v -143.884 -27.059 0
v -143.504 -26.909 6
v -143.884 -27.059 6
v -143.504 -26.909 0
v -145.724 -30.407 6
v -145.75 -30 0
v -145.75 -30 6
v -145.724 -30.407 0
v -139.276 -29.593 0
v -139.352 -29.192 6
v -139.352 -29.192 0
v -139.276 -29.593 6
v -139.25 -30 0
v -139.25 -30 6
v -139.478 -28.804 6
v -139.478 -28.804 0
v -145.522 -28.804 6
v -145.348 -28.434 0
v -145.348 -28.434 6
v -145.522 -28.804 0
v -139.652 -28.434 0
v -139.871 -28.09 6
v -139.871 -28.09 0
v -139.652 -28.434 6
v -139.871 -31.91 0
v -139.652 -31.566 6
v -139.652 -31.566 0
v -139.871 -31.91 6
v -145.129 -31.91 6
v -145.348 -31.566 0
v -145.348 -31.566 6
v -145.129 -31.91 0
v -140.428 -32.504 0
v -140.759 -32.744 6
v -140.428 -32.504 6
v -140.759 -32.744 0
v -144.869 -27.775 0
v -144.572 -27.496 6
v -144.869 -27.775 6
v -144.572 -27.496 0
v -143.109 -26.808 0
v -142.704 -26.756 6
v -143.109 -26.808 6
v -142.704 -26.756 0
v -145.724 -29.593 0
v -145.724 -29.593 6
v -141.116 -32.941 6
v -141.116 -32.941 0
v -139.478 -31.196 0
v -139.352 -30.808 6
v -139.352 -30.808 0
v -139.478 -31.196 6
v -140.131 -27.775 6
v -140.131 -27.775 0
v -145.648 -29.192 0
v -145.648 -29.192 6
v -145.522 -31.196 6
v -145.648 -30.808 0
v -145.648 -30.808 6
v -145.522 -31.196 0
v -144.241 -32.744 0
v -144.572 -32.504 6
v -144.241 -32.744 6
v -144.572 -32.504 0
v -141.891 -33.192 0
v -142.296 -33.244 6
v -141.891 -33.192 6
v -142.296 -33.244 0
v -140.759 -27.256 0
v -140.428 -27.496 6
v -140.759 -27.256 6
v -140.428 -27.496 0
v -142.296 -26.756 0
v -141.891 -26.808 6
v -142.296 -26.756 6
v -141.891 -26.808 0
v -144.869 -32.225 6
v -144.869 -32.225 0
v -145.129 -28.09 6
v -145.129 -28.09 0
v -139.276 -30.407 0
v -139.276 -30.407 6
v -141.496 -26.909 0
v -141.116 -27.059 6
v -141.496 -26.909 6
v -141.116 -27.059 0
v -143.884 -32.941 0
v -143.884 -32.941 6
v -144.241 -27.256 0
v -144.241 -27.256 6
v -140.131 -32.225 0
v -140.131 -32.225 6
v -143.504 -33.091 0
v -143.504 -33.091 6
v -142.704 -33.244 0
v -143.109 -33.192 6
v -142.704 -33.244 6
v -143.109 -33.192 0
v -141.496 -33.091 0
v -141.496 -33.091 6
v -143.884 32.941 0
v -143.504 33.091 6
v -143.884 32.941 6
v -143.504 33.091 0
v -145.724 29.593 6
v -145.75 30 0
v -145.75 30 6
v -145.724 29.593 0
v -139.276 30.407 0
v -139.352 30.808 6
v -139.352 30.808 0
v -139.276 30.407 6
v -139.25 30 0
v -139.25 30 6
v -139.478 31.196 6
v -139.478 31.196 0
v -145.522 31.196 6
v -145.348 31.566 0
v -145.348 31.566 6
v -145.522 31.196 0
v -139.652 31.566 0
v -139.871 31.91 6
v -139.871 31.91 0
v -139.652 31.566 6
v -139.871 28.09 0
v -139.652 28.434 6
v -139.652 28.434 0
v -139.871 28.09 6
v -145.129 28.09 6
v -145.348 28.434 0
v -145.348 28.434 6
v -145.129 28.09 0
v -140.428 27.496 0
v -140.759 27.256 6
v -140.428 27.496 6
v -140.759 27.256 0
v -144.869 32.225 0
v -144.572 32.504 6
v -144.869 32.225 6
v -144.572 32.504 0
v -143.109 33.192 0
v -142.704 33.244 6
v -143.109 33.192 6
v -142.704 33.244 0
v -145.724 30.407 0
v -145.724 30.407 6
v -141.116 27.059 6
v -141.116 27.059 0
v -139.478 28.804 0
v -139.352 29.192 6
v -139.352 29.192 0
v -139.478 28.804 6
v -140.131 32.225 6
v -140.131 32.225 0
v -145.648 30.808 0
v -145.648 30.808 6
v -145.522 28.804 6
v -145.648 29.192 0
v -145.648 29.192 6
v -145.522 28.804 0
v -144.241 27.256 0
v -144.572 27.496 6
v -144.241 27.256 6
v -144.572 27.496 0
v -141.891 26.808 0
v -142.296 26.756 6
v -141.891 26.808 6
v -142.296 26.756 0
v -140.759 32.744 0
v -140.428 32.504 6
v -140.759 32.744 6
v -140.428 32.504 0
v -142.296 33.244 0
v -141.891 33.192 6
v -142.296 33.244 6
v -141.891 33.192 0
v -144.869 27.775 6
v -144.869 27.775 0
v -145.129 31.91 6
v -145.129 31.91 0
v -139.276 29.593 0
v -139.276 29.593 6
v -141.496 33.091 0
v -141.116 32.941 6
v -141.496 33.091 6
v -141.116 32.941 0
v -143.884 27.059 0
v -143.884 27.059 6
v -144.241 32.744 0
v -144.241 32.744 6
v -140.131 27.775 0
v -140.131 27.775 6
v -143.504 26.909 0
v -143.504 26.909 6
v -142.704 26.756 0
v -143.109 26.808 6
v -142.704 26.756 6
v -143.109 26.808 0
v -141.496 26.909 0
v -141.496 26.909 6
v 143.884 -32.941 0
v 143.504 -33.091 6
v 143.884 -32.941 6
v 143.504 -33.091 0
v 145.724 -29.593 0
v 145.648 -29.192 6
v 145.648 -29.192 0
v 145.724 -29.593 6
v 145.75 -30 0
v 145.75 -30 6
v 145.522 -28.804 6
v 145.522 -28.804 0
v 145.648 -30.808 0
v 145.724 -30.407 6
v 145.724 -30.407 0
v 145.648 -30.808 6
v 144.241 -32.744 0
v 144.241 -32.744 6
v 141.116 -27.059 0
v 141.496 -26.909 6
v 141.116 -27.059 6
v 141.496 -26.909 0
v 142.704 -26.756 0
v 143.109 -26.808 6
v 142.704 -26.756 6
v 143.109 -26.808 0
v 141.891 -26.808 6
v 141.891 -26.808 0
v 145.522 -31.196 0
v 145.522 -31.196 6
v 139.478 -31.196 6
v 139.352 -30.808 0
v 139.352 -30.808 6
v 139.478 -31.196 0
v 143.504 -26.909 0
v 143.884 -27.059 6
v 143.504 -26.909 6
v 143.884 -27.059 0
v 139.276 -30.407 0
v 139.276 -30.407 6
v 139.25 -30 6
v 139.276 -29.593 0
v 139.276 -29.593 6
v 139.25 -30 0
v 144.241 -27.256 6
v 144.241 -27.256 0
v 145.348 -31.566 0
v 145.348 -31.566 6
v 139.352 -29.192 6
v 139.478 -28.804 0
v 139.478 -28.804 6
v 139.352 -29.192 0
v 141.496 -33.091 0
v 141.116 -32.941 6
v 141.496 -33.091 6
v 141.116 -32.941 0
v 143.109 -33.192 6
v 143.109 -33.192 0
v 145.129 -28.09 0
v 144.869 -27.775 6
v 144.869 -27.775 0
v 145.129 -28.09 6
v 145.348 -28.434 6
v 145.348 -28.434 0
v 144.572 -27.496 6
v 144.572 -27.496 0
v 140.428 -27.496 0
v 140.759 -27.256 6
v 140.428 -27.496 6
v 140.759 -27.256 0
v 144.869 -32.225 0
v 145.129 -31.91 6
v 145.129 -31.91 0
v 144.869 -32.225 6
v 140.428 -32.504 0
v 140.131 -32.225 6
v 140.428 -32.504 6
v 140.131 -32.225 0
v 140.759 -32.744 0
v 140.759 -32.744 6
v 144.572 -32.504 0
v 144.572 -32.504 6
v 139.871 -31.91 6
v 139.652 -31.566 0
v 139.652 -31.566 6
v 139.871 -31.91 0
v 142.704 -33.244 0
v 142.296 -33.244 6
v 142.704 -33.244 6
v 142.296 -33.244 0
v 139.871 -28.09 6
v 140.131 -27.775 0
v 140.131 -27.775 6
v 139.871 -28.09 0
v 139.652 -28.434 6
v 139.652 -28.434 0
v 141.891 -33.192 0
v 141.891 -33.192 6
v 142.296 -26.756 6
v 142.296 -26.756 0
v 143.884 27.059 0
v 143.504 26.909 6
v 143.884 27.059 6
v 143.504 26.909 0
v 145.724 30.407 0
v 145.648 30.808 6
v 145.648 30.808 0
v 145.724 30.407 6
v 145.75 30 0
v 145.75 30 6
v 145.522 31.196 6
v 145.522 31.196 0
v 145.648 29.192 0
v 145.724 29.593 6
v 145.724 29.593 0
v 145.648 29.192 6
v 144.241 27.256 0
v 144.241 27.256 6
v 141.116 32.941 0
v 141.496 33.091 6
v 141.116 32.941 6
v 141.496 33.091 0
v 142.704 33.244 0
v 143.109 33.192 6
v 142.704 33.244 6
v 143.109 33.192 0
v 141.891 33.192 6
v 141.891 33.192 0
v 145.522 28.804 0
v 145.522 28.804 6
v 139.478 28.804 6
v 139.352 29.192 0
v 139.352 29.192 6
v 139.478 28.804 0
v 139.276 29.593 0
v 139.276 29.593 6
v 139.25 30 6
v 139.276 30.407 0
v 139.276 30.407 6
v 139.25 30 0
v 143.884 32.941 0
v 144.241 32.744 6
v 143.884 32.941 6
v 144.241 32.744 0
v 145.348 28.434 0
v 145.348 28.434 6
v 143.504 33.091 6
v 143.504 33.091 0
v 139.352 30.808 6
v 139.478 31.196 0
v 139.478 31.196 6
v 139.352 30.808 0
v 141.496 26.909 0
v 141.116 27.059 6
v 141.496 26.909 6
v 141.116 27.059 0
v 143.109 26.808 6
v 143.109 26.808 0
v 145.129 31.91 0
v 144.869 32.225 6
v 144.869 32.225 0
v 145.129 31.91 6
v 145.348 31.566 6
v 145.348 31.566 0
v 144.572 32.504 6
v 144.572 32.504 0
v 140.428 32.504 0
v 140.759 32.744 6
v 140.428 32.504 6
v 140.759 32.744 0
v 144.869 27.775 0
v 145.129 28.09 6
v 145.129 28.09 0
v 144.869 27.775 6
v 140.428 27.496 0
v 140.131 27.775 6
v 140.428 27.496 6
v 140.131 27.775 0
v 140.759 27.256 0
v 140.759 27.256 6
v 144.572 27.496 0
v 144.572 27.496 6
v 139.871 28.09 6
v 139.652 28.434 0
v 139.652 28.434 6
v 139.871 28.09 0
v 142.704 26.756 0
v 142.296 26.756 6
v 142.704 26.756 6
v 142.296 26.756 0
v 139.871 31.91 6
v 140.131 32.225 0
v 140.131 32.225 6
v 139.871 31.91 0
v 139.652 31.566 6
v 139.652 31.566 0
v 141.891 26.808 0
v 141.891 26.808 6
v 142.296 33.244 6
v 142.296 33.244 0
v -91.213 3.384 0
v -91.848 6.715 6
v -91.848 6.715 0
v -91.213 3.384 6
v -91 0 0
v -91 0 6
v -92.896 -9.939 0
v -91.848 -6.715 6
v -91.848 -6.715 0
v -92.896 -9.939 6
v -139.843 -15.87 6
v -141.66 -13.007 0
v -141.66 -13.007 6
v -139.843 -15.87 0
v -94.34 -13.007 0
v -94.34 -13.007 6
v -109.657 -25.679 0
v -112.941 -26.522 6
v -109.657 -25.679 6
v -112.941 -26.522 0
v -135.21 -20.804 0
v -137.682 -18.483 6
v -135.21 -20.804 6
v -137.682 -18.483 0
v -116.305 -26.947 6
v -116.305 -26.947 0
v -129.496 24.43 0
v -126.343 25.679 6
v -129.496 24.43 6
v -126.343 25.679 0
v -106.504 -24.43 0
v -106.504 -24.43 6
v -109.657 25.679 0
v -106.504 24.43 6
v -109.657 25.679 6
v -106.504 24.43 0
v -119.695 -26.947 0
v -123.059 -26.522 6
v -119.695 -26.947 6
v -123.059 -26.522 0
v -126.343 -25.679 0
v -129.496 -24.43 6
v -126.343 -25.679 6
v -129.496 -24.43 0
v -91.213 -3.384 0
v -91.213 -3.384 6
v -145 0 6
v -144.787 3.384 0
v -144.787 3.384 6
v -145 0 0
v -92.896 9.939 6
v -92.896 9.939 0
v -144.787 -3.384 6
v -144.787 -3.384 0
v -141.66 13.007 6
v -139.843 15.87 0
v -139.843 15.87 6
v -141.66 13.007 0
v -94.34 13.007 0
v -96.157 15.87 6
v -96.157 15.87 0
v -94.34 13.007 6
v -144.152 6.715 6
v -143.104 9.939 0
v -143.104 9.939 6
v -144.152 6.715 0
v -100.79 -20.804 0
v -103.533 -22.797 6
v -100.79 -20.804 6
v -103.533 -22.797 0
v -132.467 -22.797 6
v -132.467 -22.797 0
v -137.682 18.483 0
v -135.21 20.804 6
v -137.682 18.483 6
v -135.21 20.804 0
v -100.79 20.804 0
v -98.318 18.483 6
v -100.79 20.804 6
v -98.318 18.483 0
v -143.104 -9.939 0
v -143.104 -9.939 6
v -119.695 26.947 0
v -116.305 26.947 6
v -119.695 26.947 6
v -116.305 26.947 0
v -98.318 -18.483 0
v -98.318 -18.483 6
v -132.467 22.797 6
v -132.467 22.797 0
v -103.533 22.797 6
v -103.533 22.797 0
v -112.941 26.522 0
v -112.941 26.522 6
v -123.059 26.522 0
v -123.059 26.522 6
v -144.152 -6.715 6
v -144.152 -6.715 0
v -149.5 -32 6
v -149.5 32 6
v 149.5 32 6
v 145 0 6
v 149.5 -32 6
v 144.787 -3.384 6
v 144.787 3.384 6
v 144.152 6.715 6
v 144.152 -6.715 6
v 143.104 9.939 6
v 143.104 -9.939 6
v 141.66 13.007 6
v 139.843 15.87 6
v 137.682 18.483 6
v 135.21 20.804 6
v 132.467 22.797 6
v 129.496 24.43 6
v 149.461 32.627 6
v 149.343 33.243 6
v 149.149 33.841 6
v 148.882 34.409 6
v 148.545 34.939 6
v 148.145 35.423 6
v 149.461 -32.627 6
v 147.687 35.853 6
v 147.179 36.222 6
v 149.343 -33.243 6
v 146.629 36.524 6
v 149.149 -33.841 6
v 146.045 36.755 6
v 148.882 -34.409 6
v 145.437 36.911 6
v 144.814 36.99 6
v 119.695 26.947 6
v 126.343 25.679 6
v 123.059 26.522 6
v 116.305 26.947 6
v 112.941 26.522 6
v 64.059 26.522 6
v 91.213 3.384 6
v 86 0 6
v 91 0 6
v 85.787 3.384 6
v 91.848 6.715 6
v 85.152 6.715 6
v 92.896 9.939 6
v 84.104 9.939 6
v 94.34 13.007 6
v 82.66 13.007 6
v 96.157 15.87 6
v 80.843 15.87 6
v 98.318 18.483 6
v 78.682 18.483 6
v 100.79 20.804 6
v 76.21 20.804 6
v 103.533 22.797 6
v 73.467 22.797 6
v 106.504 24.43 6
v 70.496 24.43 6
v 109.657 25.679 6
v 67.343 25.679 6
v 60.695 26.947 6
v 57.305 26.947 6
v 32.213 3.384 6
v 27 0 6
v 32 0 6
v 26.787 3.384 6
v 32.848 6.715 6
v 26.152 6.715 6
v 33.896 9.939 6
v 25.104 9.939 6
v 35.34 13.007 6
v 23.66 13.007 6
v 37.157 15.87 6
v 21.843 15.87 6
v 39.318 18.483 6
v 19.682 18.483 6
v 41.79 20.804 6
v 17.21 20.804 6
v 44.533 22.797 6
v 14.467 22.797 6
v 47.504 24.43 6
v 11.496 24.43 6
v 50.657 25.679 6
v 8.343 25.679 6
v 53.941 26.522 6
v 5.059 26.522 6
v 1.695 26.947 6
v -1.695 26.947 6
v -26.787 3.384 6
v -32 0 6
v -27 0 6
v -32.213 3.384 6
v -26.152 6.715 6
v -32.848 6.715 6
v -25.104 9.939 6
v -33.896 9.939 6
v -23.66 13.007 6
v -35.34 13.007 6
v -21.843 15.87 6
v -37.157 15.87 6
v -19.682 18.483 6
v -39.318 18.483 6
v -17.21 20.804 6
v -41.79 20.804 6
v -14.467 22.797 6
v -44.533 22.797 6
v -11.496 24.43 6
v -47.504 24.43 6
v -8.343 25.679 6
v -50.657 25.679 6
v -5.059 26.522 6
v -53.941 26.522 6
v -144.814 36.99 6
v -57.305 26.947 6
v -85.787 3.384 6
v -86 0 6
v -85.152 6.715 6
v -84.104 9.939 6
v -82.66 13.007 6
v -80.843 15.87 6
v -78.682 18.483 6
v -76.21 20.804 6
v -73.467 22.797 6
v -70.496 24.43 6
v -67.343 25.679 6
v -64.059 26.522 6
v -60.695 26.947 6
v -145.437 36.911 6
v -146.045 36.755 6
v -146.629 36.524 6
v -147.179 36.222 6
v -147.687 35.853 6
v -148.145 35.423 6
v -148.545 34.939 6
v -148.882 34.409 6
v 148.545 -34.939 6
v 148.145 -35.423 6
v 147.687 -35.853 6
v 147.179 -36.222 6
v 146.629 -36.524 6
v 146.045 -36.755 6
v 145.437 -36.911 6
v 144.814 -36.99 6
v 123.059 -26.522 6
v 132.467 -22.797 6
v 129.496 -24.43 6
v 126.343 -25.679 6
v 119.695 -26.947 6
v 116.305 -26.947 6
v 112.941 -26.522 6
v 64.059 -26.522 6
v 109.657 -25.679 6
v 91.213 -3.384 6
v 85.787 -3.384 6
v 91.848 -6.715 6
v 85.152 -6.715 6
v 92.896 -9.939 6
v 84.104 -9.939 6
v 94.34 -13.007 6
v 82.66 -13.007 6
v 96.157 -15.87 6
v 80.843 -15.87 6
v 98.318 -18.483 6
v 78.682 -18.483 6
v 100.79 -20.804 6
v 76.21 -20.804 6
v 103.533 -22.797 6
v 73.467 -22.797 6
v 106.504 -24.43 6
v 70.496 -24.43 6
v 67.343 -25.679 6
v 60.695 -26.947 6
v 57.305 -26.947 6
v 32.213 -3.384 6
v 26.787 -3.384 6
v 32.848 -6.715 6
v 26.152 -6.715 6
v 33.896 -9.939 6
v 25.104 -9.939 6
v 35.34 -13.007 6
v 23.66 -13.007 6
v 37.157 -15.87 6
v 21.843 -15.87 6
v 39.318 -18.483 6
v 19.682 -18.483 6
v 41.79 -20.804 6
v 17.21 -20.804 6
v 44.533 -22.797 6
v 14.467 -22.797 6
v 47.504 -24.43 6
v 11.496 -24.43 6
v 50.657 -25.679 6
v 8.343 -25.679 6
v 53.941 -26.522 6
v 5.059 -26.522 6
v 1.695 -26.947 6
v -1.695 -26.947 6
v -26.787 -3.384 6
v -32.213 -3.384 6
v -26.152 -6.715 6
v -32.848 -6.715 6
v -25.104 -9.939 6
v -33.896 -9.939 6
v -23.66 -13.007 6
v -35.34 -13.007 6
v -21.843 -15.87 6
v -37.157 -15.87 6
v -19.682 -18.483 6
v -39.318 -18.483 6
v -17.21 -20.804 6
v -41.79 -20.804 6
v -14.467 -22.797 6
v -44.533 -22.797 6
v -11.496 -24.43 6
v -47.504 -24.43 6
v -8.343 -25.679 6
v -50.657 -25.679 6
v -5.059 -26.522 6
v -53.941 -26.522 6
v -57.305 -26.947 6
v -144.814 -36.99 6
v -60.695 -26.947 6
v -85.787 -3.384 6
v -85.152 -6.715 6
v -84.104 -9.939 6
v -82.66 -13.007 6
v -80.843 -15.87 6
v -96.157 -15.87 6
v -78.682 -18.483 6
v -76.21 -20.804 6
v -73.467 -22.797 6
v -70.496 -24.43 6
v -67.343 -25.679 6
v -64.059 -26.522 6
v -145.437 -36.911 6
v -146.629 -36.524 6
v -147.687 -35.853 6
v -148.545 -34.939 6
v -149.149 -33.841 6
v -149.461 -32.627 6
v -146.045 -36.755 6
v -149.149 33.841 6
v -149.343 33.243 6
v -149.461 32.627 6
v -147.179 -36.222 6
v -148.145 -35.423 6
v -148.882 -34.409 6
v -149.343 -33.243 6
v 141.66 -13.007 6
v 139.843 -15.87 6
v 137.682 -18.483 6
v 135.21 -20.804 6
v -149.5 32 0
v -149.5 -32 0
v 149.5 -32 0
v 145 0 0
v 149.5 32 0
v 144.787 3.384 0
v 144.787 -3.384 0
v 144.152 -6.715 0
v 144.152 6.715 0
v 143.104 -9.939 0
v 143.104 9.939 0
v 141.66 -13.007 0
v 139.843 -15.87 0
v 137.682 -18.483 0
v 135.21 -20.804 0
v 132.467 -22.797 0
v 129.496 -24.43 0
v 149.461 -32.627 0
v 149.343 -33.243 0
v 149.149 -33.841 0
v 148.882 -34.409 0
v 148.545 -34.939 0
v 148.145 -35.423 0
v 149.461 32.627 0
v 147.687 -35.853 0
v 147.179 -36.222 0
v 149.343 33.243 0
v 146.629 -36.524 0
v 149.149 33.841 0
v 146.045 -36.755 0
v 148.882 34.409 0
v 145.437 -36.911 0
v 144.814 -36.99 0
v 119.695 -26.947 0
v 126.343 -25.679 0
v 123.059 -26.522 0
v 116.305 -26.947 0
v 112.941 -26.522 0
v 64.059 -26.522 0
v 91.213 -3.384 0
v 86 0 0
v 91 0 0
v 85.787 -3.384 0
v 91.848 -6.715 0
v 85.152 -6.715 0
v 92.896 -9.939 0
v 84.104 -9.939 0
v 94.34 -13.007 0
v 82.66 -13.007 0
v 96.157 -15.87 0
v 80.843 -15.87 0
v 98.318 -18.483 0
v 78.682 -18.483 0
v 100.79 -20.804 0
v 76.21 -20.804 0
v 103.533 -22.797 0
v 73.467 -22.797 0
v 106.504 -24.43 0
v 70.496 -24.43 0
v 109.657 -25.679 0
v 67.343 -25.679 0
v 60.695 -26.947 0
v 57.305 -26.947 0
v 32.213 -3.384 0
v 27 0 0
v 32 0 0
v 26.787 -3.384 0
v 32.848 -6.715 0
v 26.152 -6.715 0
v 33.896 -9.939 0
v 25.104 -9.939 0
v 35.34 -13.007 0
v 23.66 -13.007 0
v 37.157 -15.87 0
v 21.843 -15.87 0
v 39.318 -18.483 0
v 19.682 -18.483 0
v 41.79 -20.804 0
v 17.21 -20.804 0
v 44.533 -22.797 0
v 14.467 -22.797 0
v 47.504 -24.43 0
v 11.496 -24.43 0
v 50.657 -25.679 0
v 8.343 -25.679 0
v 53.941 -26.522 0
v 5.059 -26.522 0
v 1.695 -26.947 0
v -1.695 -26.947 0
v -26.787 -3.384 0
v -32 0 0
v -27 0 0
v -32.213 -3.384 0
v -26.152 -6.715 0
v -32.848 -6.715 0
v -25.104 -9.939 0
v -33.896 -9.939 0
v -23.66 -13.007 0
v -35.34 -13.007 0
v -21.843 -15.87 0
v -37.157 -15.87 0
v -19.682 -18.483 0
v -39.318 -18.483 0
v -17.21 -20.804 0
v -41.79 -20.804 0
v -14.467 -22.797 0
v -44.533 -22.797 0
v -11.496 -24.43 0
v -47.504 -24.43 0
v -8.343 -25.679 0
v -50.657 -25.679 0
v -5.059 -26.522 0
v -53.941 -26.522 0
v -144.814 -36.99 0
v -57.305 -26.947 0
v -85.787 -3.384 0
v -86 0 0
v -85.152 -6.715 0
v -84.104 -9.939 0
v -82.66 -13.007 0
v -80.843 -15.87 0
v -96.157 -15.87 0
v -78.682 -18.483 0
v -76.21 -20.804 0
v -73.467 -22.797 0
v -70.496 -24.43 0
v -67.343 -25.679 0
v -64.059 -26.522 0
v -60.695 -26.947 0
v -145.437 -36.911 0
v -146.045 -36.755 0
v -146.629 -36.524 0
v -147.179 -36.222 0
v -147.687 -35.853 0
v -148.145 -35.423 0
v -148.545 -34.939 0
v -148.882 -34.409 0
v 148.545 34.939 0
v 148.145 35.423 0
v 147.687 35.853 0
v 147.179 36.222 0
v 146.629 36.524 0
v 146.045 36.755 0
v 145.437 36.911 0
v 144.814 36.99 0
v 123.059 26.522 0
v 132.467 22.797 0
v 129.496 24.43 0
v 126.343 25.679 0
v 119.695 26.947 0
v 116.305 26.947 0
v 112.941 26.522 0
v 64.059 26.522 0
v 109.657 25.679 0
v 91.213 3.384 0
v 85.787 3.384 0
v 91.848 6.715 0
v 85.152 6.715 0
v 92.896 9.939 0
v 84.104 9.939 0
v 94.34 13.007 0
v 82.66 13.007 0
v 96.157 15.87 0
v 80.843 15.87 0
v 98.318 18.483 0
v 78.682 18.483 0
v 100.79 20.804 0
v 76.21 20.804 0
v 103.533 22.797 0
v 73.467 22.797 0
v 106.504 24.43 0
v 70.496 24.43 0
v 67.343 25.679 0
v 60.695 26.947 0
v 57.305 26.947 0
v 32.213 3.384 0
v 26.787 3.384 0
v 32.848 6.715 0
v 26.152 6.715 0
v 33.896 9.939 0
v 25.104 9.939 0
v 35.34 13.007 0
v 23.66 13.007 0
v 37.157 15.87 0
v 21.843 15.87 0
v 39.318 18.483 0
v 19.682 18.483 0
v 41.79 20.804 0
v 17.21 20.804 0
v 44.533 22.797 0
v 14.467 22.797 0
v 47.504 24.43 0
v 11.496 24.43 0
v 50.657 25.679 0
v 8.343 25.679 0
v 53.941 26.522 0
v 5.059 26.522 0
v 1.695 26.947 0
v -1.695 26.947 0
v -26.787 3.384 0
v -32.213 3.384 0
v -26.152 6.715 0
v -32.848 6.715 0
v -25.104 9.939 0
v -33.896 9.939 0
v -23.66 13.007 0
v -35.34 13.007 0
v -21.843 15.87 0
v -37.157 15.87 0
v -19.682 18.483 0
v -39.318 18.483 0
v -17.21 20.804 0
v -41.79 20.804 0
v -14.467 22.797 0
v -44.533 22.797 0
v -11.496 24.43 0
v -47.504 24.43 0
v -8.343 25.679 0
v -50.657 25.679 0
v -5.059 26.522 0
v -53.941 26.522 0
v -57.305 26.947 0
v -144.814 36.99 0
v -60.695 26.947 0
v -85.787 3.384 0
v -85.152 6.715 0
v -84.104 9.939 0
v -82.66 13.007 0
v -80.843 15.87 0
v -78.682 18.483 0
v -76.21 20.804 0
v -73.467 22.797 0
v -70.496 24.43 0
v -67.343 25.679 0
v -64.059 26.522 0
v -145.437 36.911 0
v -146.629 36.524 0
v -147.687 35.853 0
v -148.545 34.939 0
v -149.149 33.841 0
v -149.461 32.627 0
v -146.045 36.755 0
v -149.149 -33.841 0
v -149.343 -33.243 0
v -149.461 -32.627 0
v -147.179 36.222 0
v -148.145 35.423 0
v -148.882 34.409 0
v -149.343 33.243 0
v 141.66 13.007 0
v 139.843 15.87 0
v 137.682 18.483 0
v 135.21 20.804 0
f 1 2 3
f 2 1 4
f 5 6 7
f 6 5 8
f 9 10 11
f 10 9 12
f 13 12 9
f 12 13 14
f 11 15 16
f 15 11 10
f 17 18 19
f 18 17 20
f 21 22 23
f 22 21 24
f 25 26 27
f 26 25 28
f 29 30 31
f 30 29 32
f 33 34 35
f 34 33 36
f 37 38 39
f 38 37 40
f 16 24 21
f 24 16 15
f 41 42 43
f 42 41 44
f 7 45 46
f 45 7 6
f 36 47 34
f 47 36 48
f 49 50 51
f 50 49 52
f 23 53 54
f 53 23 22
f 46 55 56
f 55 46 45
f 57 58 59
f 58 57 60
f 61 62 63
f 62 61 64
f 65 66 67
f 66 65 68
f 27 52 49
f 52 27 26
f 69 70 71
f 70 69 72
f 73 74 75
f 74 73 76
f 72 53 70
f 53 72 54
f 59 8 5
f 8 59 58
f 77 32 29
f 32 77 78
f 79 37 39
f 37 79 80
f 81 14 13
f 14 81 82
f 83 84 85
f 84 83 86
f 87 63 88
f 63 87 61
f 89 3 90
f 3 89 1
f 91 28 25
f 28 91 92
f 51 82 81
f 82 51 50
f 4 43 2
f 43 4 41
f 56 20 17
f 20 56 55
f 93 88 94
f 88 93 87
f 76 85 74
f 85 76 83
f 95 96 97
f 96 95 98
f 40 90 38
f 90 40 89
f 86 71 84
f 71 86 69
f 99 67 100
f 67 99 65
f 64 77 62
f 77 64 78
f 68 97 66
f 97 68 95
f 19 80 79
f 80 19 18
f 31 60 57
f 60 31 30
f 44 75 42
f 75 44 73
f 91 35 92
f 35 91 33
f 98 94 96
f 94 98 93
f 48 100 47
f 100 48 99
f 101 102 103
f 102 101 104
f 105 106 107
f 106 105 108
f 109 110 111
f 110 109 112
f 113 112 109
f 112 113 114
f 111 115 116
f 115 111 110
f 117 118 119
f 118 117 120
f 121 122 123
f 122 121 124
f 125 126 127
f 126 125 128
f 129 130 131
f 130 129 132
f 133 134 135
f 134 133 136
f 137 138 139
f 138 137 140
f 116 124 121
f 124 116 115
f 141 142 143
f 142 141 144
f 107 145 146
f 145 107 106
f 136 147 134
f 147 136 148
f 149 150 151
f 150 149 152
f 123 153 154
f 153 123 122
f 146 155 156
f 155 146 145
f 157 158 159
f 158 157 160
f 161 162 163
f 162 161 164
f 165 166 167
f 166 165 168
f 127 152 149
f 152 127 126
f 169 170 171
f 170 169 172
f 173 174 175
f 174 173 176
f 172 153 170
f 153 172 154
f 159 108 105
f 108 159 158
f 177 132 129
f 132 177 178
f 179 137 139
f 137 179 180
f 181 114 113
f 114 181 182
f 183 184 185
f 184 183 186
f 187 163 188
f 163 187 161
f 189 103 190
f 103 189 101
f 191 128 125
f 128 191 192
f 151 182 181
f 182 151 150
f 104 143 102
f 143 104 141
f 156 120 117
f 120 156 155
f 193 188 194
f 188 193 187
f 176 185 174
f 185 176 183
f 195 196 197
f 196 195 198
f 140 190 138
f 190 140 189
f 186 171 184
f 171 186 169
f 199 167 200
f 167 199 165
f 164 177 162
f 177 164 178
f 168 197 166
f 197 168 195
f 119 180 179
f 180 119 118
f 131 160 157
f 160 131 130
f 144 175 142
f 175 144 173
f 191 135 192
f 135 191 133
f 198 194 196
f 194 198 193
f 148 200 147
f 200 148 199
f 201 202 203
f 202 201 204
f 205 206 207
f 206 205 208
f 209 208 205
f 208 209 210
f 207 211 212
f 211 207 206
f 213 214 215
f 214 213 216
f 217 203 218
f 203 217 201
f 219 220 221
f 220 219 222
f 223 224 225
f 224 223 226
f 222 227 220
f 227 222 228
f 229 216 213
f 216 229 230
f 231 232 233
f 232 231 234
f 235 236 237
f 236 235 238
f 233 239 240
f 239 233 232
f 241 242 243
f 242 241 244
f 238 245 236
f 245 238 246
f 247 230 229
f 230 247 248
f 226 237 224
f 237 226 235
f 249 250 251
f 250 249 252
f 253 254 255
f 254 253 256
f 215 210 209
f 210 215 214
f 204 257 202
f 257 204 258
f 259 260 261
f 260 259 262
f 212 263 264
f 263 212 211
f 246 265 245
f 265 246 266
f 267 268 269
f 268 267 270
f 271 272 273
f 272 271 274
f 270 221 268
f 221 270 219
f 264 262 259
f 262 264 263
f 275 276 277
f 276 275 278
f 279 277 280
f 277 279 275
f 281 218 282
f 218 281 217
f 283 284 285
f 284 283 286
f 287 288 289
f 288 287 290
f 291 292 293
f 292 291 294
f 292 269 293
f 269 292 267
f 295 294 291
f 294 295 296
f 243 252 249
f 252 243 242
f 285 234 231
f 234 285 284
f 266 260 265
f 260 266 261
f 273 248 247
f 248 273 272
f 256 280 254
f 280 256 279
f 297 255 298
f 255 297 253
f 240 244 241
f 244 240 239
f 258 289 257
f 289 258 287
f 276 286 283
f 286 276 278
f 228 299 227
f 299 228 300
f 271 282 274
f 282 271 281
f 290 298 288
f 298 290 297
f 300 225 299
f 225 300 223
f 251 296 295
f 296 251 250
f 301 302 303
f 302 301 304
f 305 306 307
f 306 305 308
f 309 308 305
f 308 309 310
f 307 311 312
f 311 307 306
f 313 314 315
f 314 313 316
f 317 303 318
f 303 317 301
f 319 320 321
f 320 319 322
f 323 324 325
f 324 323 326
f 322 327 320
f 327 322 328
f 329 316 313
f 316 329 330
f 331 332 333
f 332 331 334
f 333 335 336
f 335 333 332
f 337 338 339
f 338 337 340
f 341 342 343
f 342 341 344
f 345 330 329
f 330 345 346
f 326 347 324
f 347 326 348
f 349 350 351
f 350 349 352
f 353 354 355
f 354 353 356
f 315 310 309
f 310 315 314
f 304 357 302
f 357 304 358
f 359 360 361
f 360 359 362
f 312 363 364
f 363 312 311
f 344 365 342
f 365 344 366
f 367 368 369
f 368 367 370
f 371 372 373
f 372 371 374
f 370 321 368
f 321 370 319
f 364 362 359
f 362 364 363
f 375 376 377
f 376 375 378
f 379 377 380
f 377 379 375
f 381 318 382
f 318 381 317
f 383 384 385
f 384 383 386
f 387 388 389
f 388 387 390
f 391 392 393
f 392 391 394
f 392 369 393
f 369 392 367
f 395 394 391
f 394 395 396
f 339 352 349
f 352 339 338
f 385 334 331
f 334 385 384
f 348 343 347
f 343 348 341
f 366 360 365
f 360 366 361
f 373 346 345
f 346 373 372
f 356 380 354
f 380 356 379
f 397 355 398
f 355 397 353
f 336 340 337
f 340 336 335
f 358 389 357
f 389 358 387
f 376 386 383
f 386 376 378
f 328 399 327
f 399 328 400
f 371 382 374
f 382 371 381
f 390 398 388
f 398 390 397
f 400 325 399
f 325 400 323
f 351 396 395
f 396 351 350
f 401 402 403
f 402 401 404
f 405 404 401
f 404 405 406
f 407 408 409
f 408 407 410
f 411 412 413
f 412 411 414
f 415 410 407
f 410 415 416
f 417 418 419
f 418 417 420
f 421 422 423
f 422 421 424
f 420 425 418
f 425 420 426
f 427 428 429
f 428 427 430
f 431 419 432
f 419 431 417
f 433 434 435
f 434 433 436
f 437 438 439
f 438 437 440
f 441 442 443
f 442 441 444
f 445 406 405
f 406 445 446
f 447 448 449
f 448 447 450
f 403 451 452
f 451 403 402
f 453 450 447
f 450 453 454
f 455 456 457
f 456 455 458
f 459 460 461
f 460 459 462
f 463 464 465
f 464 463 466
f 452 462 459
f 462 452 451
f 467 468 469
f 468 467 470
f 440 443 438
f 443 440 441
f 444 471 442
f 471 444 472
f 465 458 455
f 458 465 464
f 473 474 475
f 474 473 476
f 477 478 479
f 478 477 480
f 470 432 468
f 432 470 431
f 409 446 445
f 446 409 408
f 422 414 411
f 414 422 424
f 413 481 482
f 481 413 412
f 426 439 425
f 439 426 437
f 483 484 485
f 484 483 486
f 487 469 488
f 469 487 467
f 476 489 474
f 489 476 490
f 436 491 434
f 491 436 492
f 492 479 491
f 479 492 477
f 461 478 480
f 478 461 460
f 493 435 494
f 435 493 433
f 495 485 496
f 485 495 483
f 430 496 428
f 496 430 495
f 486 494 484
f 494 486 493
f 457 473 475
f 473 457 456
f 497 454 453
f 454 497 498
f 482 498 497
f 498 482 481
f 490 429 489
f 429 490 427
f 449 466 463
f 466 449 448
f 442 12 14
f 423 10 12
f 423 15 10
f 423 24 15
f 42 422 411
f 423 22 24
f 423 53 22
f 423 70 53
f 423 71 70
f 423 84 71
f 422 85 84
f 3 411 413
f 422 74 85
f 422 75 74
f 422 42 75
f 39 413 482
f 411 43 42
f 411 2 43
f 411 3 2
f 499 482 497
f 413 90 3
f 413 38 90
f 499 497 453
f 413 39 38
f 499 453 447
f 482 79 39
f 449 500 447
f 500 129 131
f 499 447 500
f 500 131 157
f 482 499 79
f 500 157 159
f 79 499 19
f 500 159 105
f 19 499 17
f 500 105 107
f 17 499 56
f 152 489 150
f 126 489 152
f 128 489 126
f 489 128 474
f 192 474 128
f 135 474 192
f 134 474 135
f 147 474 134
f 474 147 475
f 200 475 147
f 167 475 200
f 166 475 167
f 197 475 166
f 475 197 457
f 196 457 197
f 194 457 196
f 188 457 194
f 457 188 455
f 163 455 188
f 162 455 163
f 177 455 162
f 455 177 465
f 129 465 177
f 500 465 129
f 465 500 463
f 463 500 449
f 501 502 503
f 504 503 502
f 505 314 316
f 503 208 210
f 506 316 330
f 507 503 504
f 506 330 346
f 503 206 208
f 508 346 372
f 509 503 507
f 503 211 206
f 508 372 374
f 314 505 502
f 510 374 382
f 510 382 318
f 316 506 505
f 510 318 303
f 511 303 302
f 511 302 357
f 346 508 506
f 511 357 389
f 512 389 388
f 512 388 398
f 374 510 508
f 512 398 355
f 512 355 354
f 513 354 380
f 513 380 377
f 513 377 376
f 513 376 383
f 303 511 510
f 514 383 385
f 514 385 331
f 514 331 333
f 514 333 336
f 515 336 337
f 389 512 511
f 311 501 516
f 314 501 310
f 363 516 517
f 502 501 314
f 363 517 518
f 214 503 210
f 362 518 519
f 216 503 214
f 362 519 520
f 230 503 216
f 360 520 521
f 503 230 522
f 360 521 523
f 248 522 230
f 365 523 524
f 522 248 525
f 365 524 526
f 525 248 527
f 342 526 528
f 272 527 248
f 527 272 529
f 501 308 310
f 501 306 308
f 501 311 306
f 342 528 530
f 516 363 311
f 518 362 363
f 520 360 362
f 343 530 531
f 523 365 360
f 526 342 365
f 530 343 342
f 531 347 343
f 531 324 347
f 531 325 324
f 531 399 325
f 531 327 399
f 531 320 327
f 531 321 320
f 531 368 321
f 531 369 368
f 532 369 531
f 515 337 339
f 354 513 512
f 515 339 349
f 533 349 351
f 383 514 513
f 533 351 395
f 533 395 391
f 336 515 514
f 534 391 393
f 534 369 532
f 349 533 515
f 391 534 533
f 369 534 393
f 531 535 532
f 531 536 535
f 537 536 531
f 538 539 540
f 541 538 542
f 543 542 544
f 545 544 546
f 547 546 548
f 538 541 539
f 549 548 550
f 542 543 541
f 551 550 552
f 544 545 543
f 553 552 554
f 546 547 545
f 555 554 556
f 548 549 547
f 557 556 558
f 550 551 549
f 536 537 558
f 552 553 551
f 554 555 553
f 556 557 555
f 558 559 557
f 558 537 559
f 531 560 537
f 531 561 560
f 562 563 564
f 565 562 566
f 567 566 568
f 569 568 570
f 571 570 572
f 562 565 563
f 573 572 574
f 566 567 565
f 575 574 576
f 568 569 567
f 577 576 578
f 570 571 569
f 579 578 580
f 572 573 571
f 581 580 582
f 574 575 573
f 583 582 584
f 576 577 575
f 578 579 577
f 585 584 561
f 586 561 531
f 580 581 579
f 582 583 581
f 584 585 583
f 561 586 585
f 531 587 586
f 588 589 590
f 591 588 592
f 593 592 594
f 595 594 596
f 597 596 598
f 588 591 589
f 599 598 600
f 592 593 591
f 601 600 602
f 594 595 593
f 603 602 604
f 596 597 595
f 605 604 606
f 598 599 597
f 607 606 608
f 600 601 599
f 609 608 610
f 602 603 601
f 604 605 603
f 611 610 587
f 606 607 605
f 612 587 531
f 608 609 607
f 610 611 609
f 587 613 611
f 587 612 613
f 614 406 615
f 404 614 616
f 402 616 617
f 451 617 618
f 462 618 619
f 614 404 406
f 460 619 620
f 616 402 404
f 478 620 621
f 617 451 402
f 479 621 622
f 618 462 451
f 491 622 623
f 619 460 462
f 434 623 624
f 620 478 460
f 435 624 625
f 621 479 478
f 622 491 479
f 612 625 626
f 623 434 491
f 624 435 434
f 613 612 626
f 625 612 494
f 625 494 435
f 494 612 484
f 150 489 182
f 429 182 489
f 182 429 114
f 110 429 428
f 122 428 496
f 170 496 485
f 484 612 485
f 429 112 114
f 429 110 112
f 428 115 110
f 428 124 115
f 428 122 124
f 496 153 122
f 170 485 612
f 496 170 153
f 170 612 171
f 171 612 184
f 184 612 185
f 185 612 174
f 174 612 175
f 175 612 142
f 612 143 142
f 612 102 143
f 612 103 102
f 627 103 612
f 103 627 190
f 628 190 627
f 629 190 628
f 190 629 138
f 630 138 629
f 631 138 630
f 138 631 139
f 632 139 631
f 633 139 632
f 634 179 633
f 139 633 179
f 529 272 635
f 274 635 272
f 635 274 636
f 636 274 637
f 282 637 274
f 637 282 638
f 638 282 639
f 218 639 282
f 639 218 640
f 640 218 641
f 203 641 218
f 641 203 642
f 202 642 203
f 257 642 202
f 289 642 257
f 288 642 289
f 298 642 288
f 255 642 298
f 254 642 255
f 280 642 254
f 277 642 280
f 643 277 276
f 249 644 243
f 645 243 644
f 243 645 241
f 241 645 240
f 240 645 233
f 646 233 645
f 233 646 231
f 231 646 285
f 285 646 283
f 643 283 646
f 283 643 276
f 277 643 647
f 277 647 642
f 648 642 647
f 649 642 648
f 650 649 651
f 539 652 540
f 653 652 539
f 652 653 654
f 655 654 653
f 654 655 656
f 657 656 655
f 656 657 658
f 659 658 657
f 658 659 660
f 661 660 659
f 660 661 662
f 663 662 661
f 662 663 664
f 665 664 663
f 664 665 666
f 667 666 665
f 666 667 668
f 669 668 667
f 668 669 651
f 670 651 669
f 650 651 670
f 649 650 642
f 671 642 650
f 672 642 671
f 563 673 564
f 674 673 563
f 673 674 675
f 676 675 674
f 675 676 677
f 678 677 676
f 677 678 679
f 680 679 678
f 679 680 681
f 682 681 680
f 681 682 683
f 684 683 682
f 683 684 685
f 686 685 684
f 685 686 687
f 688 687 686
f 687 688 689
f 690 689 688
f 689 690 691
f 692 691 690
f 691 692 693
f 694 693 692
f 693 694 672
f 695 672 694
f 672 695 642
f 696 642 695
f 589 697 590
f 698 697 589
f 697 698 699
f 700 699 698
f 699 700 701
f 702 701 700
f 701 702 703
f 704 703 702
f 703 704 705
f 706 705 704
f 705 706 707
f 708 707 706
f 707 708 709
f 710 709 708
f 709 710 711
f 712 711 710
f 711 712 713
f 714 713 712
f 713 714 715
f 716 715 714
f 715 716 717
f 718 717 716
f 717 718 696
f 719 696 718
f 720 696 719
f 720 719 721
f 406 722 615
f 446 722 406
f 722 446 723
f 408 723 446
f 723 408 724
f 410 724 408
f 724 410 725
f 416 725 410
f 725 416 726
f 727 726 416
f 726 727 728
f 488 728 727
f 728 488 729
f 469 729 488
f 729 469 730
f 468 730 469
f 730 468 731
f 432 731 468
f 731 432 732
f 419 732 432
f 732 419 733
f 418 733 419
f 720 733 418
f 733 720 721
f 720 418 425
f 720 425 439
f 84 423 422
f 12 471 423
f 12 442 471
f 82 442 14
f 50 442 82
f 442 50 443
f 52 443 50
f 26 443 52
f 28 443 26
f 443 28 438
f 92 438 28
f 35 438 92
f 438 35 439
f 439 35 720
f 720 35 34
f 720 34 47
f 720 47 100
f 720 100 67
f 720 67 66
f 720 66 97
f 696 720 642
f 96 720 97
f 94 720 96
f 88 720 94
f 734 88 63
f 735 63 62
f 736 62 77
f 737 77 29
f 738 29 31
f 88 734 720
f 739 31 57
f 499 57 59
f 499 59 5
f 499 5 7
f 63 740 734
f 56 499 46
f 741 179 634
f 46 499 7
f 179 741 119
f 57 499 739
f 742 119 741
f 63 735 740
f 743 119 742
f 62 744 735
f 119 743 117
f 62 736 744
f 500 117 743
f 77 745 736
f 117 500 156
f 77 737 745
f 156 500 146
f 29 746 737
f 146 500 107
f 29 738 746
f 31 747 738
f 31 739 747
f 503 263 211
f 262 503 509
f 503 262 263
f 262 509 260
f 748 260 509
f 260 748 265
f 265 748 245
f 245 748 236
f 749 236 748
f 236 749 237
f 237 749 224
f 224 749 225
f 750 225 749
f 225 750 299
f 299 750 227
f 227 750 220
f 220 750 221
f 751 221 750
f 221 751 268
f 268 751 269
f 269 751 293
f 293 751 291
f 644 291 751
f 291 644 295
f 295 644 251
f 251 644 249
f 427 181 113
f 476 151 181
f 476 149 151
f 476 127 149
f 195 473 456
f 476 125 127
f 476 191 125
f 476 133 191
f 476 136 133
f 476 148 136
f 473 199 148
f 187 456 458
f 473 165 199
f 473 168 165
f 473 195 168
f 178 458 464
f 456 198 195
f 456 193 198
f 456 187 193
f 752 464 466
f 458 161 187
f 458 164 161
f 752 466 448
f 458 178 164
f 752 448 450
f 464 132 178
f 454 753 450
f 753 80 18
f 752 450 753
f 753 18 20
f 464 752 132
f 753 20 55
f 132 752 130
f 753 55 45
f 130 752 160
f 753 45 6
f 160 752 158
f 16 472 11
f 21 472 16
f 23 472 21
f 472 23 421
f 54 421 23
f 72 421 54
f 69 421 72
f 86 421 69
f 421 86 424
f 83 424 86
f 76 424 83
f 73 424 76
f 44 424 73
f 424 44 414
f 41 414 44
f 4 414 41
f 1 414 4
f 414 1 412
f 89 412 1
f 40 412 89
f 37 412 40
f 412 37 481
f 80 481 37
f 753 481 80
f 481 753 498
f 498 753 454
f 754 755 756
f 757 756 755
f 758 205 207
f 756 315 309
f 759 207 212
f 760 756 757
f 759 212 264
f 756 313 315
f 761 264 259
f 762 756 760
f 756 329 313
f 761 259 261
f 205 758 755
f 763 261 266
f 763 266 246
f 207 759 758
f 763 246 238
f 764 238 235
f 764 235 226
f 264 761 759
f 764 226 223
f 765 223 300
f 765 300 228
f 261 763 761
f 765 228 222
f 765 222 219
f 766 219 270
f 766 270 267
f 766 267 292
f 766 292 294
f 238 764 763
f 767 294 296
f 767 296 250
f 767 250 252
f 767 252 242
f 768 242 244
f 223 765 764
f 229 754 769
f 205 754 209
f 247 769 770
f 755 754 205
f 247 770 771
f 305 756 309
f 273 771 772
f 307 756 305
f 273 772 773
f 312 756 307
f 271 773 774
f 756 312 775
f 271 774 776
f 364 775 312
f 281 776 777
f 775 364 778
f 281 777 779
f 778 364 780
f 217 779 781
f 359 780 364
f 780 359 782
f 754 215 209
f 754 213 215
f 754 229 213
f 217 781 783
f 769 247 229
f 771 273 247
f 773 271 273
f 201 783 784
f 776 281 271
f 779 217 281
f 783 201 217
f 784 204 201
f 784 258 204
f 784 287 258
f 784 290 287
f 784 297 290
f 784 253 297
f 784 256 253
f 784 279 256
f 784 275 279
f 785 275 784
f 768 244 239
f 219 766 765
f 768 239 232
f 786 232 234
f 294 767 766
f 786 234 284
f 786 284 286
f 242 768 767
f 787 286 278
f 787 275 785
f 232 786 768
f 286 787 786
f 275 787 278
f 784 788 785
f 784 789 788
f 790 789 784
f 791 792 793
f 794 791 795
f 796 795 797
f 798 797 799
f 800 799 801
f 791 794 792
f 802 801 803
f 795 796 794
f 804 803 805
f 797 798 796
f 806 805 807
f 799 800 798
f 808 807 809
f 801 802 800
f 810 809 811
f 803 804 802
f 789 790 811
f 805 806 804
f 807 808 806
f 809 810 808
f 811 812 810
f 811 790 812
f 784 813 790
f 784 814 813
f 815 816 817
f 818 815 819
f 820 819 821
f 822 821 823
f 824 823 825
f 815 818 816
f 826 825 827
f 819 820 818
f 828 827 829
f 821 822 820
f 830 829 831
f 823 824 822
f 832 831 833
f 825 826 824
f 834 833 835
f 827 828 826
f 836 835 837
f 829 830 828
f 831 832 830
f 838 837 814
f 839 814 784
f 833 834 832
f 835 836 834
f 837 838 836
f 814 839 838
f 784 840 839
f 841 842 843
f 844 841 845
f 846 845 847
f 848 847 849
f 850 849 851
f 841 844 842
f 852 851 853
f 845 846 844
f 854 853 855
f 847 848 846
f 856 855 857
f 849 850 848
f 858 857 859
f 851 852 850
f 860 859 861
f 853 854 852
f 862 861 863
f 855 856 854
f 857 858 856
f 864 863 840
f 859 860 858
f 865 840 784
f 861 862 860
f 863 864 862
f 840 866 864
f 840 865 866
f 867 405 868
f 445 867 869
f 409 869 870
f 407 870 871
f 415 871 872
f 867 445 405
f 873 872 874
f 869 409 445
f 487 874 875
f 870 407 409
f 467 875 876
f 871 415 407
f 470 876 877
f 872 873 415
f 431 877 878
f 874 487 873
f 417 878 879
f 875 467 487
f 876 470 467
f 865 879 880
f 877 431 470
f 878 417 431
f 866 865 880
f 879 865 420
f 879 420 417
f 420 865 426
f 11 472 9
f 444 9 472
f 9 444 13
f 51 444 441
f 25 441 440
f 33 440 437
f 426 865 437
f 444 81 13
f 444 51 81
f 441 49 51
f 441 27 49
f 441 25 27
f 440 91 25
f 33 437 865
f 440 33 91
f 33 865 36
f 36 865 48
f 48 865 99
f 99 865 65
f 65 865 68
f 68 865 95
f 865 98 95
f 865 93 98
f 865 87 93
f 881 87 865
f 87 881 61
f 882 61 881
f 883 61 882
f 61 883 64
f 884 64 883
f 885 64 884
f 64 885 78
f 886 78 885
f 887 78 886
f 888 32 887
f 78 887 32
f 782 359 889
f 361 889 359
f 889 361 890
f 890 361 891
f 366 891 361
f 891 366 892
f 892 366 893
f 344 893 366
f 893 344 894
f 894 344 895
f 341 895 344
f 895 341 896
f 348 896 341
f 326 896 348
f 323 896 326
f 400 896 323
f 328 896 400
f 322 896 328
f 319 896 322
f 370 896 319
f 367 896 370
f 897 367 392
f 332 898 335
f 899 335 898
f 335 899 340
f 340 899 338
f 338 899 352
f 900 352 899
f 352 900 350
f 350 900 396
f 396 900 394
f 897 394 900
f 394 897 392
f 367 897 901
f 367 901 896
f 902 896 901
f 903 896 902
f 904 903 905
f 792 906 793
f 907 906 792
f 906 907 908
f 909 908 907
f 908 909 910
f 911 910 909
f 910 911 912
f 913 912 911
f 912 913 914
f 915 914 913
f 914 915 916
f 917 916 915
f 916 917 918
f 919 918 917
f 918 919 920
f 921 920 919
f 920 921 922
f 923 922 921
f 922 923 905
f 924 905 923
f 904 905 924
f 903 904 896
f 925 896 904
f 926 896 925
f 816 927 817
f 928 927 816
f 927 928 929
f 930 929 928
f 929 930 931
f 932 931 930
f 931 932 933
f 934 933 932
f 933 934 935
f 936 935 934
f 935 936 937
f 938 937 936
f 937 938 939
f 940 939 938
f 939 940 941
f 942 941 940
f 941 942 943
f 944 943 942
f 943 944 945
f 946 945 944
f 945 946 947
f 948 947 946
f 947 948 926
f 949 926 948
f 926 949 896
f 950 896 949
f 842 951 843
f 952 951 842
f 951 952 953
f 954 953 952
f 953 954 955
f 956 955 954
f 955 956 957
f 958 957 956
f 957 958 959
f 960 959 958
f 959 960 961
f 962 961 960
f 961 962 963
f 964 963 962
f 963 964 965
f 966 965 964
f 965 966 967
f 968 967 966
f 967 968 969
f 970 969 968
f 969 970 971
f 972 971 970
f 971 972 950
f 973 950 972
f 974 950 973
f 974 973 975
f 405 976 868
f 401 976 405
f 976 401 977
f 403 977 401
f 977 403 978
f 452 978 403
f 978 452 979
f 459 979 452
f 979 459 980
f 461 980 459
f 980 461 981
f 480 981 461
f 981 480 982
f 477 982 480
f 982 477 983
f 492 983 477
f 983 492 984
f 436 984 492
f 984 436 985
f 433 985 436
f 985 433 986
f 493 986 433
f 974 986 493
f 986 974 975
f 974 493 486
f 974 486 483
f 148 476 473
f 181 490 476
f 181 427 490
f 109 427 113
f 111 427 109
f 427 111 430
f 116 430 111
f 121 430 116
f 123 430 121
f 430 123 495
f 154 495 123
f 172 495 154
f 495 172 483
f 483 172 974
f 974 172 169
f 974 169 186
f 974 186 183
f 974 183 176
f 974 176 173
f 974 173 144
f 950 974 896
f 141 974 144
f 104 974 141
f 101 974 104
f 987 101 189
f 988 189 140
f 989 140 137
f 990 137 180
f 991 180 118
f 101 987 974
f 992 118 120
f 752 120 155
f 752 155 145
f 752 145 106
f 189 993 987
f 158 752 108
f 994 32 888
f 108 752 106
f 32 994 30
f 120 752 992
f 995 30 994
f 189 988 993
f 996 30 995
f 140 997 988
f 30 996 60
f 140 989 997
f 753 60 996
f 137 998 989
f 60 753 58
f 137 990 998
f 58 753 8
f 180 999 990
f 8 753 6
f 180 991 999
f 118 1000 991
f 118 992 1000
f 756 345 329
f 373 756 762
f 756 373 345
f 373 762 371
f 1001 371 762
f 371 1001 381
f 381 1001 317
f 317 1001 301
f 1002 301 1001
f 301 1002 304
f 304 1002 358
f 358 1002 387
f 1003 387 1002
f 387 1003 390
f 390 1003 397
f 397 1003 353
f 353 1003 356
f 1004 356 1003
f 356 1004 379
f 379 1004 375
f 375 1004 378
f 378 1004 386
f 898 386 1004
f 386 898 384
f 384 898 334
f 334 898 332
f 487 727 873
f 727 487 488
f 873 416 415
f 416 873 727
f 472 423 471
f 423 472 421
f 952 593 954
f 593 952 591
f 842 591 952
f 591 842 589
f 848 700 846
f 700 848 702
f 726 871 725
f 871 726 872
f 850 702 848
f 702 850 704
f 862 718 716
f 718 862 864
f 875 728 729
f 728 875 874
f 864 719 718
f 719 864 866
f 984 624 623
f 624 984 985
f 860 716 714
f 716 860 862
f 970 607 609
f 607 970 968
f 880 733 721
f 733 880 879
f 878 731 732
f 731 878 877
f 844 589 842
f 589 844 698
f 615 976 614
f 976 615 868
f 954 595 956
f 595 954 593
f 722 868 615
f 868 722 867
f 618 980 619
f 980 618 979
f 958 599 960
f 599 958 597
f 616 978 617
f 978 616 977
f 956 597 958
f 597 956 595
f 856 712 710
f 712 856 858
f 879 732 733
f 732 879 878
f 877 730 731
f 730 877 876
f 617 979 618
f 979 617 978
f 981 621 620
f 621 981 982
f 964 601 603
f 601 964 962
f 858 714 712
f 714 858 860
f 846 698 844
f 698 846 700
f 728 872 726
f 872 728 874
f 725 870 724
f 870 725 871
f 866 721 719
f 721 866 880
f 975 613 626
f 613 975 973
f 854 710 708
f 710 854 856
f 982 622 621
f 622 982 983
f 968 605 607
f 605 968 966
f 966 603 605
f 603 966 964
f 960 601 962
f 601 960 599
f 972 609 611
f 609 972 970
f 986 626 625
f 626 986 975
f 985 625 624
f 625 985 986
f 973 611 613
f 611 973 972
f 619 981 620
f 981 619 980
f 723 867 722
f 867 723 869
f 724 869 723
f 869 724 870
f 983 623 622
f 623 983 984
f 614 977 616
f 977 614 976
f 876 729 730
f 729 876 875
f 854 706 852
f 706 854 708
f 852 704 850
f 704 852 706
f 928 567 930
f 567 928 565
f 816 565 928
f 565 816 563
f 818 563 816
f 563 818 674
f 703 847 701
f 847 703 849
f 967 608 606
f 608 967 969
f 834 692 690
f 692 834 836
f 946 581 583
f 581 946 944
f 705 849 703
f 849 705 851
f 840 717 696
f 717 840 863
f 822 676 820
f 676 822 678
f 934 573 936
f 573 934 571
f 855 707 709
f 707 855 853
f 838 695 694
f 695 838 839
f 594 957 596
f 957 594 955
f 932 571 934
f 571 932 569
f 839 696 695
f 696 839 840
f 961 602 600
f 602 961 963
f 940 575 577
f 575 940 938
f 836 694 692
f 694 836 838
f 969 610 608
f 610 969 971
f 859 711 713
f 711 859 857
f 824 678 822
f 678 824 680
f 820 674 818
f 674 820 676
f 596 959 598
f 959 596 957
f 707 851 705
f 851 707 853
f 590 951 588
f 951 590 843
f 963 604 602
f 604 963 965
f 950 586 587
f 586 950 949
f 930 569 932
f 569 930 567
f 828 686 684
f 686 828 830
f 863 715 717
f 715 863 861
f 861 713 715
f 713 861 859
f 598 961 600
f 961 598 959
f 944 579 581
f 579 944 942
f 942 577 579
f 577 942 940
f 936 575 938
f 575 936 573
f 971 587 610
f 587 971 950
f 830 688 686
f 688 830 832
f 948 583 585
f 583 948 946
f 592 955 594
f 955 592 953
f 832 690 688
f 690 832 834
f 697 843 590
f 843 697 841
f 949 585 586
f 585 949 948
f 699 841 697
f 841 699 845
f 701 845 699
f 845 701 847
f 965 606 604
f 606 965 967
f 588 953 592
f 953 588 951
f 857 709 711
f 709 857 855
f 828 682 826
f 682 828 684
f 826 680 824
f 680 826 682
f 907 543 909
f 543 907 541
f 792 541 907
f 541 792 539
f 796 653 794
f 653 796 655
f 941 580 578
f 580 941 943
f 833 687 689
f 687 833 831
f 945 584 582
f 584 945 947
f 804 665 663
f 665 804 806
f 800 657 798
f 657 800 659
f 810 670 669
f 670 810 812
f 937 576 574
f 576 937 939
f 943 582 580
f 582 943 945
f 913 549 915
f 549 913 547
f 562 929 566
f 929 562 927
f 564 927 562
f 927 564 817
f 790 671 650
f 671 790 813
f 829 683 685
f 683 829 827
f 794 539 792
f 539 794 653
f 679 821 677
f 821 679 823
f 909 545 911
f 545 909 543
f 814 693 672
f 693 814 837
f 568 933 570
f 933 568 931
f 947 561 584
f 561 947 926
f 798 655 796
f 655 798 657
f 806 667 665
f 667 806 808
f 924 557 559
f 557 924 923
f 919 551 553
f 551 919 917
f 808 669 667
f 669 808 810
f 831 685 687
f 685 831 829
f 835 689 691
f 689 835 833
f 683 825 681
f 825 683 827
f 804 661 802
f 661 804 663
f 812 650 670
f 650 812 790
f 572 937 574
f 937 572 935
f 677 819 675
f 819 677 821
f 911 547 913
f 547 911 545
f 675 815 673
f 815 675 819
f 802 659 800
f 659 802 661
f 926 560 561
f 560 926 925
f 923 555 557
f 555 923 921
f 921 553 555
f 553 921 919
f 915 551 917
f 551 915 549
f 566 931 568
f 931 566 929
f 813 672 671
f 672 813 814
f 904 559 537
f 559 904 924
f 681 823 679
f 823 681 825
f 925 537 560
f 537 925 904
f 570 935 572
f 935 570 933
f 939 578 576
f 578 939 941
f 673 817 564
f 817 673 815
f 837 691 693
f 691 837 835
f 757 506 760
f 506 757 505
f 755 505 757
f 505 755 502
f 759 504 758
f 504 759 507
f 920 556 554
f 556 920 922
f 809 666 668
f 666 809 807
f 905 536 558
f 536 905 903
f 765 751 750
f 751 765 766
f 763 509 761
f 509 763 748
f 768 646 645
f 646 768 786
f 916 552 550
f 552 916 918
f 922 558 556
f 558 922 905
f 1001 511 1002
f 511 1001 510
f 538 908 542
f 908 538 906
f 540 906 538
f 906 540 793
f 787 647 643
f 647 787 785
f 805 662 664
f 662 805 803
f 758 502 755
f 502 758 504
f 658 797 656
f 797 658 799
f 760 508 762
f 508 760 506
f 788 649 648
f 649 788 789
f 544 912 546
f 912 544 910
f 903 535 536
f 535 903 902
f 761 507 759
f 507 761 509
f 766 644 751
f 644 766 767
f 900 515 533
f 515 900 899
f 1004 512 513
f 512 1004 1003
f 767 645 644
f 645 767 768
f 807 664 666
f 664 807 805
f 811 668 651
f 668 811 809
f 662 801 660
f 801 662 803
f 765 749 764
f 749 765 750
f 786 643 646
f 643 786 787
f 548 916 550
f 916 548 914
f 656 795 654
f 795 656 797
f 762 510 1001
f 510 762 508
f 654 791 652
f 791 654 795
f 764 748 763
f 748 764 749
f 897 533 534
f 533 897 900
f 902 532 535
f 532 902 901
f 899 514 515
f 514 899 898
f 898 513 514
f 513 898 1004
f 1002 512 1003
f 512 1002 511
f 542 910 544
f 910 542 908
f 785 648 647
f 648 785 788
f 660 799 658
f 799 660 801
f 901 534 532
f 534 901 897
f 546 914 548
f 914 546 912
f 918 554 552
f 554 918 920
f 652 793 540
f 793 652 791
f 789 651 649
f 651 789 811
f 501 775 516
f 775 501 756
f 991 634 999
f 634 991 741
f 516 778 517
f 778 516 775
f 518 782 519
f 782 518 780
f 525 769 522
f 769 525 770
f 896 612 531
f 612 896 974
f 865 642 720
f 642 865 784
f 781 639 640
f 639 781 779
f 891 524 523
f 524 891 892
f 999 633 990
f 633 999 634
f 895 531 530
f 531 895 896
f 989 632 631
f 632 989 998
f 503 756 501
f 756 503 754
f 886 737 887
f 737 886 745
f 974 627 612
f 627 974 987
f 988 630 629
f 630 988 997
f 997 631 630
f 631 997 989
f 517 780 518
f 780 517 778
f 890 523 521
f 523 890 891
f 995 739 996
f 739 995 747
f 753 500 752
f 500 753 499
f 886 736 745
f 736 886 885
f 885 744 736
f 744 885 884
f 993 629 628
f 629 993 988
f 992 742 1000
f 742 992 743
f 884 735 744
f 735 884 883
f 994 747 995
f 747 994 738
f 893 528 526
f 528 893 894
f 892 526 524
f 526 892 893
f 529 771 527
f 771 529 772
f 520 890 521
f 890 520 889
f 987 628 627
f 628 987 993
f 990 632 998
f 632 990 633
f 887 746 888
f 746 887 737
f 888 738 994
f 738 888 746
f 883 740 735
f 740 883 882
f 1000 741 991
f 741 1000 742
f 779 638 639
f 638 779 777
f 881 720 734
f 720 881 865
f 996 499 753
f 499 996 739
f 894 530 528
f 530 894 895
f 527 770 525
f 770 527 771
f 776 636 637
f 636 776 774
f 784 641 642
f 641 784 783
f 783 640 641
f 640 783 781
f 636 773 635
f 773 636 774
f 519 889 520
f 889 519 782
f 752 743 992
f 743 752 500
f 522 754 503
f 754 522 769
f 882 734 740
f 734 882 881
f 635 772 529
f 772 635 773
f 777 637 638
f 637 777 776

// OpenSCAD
$fn = 50;

difference() {
	union() {
		hull() {
			translate(v = [-144.5, 32.0, 0]) {
				cylinder(h = 6, r = 5);
			}
			translate(v = [144.5, 32.0, 0]) {
				cylinder(h = 6, r = 5);
			}
			translate(v = [-144.5, -32.0, 0]) {
				cylinder(h = 6, r = 5);
			}
			translate(v = [144.5, -32.0, 0]) {
				cylinder(h = 6, r = 5);
			}
		}
	}
	union() {
		translate(v = [-142.5, -30.0, -100.0]) {
			cylinder(h = 200, r = 3.25);
		}
		translate(v = [-142.5, 30.0, -100.0]) {
			cylinder(h = 200, r = 3.25);
		}
		translate(v = [142.5, -30.0, -100.0]) {
			cylinder(h = 200, r = 3.25);
		}
		translate(v = [142.5, 30.0, -100.0]) {
			cylinder(h = 200, r = 3.25);
		}
		translate(v = [-142.5, -30.0, -100.0]) {
			cylinder(h = 200, r = 1.8);
		}
		translate(v = [-142.5, 30.0, -100.0]) {
			cylinder(h = 200, r = 1.8);
		}
		translate(v = [142.5, -30.0, -100.0]) {
			cylinder(h = 200, r = 1.8);
		}
		translate(v = [142.5, 30.0, -100.0]) {
			cylinder(h = 200, r = 1.8);
		}
		translate(v = [-118.0, 0, 0.0]) {
			cylinder(h = 6, r = 27.0);
		}
		translate(v = [-59.0, 0, 0.0]) {
			cylinder(h = 6, r = 27.0);
		}
		cylinder(h = 6, r = 27.0);
		translate(v = [59.0, 0, 0.0]) {
			cylinder(h = 6, r = 27.0);
		}
		translate(v = [118.0, 0, 0.0]) {
			cylinder(h = 6, r = 27.0);
		}
	}
}
